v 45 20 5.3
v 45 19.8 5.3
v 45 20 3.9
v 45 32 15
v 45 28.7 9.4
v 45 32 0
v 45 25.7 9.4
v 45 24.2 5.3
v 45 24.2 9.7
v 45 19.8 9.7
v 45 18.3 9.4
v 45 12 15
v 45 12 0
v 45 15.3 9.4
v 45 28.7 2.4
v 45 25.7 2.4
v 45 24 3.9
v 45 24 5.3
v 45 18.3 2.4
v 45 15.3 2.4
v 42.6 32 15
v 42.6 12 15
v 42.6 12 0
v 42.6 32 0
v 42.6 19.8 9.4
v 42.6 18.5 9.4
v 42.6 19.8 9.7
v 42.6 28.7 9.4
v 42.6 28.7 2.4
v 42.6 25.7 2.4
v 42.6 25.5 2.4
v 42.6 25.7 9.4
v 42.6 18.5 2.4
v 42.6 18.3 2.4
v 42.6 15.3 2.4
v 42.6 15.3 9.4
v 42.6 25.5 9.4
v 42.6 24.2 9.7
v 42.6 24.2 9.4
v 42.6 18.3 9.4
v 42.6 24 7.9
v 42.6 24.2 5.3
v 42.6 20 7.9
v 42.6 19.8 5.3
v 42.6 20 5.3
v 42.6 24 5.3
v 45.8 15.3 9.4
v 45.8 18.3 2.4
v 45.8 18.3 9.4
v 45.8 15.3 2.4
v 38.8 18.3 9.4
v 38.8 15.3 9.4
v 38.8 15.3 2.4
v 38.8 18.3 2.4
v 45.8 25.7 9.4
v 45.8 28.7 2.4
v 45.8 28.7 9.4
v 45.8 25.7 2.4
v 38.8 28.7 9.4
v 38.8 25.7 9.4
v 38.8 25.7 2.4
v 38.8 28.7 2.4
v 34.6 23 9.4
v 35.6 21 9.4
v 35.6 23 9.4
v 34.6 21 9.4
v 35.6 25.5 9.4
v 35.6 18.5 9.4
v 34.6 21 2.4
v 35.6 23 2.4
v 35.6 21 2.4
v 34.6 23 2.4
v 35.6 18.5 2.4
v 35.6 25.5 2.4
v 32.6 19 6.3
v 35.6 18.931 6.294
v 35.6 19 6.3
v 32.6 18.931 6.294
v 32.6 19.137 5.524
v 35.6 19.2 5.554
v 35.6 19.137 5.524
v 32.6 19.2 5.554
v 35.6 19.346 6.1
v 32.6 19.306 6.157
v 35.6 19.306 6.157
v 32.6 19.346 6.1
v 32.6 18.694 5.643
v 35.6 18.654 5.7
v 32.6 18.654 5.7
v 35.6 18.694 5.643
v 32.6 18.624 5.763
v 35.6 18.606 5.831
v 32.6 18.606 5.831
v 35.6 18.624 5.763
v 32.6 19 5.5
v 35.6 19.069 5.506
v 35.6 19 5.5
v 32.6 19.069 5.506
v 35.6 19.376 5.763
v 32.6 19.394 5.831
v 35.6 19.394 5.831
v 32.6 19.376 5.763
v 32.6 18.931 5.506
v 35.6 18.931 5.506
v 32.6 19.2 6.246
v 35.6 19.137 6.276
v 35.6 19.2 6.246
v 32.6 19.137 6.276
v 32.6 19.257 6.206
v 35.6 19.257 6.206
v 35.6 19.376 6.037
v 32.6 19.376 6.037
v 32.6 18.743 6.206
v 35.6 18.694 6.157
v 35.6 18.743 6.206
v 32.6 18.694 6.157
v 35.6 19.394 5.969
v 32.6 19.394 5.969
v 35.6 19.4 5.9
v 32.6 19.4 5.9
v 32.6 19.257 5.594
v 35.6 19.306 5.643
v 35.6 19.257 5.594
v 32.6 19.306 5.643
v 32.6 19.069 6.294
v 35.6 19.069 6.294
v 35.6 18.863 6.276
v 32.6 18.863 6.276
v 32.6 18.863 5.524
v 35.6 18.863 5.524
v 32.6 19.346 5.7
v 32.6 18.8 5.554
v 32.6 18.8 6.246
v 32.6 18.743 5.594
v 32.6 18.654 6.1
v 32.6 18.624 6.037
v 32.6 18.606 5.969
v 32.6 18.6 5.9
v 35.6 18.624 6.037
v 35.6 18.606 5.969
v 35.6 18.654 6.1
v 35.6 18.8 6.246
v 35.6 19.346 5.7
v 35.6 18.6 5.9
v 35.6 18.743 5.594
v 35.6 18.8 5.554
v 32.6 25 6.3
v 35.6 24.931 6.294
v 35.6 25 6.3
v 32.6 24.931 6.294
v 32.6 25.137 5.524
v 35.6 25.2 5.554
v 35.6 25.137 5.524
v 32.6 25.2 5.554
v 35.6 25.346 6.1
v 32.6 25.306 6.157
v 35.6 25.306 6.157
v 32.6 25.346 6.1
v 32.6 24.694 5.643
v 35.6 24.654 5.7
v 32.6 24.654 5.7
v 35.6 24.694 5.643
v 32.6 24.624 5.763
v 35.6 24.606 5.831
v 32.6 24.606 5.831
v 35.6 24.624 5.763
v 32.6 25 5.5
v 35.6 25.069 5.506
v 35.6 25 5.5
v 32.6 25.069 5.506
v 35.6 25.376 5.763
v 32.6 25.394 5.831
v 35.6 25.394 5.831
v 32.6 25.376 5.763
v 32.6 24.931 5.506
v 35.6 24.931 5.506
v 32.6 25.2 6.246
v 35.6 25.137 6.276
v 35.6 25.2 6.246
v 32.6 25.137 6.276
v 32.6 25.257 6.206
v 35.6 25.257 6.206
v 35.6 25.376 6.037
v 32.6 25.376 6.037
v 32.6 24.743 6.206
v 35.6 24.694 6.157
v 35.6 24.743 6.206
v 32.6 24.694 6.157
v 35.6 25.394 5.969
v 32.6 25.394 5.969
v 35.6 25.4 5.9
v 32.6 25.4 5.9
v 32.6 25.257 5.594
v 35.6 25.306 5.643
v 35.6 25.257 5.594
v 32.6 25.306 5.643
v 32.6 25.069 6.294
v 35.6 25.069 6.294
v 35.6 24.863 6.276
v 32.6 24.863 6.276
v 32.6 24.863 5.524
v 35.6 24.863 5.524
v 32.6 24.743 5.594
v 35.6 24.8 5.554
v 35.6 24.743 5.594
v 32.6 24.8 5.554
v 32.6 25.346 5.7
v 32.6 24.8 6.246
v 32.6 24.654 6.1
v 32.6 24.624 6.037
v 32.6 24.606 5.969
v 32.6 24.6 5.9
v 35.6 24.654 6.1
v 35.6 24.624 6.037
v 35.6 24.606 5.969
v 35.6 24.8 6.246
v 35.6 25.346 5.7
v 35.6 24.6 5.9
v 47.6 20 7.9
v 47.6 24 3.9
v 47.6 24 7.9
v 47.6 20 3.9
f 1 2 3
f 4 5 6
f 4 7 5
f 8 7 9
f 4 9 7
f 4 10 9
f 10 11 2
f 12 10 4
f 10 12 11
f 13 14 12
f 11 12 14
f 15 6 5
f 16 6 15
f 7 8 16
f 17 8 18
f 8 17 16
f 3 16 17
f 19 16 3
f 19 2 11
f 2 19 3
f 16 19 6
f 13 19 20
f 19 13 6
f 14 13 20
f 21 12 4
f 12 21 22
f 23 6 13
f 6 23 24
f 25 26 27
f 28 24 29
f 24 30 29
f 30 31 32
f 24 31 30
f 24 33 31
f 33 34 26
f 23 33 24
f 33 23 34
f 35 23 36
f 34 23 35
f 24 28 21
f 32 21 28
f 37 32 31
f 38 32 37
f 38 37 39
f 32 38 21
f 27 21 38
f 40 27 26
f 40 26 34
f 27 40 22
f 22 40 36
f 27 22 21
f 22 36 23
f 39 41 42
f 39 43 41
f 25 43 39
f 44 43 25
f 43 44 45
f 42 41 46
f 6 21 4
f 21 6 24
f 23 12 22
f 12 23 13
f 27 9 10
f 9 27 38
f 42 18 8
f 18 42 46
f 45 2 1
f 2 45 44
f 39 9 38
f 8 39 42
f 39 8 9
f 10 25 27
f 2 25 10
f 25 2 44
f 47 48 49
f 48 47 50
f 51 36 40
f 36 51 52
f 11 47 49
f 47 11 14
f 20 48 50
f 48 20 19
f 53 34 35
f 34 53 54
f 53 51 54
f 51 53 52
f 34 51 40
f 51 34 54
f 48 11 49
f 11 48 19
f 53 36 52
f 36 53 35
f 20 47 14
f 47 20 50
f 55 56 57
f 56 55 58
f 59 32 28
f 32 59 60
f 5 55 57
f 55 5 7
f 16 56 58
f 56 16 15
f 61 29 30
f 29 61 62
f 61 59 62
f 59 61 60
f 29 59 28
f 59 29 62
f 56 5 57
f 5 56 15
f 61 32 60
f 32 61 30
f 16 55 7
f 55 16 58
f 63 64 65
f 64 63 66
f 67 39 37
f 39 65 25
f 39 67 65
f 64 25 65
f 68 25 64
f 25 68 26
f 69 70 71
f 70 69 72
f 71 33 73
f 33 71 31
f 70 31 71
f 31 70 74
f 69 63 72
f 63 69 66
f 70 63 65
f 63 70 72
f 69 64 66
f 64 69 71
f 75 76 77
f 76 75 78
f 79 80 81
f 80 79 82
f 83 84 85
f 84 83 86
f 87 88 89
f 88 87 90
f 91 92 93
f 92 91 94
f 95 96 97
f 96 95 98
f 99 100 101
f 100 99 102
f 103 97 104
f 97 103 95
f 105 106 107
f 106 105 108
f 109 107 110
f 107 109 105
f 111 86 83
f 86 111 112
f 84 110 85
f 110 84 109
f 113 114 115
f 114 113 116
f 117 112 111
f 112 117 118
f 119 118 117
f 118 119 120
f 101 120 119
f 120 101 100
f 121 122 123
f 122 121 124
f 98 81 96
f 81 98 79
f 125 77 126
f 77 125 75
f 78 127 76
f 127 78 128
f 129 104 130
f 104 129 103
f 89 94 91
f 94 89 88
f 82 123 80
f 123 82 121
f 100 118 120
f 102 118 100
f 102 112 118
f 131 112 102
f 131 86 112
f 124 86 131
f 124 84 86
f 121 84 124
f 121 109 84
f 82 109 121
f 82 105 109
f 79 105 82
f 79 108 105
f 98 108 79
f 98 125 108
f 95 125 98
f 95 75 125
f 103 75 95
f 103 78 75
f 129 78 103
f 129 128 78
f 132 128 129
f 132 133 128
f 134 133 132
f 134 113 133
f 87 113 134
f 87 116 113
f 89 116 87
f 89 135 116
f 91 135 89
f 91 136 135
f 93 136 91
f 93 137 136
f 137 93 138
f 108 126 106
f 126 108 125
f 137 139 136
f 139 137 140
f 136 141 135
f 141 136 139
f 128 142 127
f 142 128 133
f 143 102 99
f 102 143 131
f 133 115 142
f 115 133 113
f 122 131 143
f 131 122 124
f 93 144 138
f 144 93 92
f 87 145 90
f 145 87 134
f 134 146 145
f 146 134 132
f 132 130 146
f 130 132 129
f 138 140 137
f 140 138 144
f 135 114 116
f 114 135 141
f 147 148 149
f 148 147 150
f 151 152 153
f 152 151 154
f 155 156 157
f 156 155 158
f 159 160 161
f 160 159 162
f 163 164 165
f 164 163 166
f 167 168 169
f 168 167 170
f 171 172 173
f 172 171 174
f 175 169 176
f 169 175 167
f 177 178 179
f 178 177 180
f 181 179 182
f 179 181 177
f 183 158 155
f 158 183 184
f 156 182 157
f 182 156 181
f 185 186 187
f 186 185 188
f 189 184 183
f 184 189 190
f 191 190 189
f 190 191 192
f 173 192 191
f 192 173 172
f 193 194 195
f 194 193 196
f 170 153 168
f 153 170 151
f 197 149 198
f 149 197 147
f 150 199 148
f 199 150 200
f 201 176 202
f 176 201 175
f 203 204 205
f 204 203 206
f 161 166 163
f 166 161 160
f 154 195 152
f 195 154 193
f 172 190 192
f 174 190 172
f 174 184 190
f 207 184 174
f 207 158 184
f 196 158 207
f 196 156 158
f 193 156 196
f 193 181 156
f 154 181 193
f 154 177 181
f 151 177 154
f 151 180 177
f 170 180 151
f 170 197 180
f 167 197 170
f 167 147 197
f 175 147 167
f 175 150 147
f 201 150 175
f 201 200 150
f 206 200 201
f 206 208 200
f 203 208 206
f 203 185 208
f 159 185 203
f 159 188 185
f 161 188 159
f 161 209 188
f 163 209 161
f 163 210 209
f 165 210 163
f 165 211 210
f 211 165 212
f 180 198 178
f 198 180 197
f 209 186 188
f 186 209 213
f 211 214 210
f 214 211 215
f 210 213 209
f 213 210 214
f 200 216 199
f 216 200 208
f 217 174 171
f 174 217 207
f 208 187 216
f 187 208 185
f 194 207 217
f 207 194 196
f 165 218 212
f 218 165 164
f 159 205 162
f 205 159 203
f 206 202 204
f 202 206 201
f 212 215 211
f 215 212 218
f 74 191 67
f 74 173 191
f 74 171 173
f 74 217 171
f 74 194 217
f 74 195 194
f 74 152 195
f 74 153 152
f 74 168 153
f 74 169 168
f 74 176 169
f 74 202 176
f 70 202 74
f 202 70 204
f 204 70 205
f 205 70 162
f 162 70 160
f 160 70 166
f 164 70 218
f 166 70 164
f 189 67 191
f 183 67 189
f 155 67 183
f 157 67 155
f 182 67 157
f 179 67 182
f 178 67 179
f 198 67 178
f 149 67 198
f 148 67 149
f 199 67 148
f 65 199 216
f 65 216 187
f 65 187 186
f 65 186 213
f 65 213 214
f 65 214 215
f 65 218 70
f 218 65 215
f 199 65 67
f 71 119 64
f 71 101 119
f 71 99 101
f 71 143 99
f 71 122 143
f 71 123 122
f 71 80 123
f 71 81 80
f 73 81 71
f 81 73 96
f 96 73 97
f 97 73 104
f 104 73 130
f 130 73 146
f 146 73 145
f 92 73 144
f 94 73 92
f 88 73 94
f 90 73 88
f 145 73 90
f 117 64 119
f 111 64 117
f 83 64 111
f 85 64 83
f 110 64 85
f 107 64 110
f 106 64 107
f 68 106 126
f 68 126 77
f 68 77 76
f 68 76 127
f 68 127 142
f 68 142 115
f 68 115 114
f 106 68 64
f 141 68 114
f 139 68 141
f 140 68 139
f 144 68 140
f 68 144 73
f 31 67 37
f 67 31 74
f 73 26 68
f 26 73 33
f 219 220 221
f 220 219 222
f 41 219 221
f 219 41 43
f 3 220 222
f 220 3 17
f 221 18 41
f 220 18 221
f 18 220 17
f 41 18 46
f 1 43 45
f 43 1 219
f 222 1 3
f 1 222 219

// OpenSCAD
// Detail view of the side-switch support. Presentation model only.
use <xiaozhi_enclosure.scad>

$fn = 36;

// A small section of the +X enclosure wall around the 7.4 x 7.4 opening.
color([0.78, 0.82, 0.88, 0.85])
    difference() {
        translate([43.8, 22, 7.5])
            cube([2.4, 20, 15], center=true);
        translate([43.8, 22, 7.5])
            cube([4.4, 4.4, 4.4], center=true);
    }

color([0.78, 0.82, 0.88, 0.9])
    switch_cradle();

// Reference clamped switch body. The requested support geometry defines a
// 7 mm body depth; actuator and pins account for the remaining overall length.
color([0.12, 0.12, 0.14, 0.72])
    translate([39.1, 22, 5.9])
        cube([7, 7, 7], center=true);

// 4 x 4 x 5 mm blue actuator; about 2.6 mm remains outside a 2.4 mm wall.
color([0.10, 0.32, 0.88])
    translate([45.1, 22, 5.9])
        cube([5, 4, 4], center=true);

// Four-millimetre pin/wire-side clearance reference.
color([0.78, 0.60, 0.12])
    for (dy = [-3, 3])
        translate([32.6, 22+dy, 5.9])
            rotate([0, 90, 0])
                cylinder(d=0.8, h=4);
